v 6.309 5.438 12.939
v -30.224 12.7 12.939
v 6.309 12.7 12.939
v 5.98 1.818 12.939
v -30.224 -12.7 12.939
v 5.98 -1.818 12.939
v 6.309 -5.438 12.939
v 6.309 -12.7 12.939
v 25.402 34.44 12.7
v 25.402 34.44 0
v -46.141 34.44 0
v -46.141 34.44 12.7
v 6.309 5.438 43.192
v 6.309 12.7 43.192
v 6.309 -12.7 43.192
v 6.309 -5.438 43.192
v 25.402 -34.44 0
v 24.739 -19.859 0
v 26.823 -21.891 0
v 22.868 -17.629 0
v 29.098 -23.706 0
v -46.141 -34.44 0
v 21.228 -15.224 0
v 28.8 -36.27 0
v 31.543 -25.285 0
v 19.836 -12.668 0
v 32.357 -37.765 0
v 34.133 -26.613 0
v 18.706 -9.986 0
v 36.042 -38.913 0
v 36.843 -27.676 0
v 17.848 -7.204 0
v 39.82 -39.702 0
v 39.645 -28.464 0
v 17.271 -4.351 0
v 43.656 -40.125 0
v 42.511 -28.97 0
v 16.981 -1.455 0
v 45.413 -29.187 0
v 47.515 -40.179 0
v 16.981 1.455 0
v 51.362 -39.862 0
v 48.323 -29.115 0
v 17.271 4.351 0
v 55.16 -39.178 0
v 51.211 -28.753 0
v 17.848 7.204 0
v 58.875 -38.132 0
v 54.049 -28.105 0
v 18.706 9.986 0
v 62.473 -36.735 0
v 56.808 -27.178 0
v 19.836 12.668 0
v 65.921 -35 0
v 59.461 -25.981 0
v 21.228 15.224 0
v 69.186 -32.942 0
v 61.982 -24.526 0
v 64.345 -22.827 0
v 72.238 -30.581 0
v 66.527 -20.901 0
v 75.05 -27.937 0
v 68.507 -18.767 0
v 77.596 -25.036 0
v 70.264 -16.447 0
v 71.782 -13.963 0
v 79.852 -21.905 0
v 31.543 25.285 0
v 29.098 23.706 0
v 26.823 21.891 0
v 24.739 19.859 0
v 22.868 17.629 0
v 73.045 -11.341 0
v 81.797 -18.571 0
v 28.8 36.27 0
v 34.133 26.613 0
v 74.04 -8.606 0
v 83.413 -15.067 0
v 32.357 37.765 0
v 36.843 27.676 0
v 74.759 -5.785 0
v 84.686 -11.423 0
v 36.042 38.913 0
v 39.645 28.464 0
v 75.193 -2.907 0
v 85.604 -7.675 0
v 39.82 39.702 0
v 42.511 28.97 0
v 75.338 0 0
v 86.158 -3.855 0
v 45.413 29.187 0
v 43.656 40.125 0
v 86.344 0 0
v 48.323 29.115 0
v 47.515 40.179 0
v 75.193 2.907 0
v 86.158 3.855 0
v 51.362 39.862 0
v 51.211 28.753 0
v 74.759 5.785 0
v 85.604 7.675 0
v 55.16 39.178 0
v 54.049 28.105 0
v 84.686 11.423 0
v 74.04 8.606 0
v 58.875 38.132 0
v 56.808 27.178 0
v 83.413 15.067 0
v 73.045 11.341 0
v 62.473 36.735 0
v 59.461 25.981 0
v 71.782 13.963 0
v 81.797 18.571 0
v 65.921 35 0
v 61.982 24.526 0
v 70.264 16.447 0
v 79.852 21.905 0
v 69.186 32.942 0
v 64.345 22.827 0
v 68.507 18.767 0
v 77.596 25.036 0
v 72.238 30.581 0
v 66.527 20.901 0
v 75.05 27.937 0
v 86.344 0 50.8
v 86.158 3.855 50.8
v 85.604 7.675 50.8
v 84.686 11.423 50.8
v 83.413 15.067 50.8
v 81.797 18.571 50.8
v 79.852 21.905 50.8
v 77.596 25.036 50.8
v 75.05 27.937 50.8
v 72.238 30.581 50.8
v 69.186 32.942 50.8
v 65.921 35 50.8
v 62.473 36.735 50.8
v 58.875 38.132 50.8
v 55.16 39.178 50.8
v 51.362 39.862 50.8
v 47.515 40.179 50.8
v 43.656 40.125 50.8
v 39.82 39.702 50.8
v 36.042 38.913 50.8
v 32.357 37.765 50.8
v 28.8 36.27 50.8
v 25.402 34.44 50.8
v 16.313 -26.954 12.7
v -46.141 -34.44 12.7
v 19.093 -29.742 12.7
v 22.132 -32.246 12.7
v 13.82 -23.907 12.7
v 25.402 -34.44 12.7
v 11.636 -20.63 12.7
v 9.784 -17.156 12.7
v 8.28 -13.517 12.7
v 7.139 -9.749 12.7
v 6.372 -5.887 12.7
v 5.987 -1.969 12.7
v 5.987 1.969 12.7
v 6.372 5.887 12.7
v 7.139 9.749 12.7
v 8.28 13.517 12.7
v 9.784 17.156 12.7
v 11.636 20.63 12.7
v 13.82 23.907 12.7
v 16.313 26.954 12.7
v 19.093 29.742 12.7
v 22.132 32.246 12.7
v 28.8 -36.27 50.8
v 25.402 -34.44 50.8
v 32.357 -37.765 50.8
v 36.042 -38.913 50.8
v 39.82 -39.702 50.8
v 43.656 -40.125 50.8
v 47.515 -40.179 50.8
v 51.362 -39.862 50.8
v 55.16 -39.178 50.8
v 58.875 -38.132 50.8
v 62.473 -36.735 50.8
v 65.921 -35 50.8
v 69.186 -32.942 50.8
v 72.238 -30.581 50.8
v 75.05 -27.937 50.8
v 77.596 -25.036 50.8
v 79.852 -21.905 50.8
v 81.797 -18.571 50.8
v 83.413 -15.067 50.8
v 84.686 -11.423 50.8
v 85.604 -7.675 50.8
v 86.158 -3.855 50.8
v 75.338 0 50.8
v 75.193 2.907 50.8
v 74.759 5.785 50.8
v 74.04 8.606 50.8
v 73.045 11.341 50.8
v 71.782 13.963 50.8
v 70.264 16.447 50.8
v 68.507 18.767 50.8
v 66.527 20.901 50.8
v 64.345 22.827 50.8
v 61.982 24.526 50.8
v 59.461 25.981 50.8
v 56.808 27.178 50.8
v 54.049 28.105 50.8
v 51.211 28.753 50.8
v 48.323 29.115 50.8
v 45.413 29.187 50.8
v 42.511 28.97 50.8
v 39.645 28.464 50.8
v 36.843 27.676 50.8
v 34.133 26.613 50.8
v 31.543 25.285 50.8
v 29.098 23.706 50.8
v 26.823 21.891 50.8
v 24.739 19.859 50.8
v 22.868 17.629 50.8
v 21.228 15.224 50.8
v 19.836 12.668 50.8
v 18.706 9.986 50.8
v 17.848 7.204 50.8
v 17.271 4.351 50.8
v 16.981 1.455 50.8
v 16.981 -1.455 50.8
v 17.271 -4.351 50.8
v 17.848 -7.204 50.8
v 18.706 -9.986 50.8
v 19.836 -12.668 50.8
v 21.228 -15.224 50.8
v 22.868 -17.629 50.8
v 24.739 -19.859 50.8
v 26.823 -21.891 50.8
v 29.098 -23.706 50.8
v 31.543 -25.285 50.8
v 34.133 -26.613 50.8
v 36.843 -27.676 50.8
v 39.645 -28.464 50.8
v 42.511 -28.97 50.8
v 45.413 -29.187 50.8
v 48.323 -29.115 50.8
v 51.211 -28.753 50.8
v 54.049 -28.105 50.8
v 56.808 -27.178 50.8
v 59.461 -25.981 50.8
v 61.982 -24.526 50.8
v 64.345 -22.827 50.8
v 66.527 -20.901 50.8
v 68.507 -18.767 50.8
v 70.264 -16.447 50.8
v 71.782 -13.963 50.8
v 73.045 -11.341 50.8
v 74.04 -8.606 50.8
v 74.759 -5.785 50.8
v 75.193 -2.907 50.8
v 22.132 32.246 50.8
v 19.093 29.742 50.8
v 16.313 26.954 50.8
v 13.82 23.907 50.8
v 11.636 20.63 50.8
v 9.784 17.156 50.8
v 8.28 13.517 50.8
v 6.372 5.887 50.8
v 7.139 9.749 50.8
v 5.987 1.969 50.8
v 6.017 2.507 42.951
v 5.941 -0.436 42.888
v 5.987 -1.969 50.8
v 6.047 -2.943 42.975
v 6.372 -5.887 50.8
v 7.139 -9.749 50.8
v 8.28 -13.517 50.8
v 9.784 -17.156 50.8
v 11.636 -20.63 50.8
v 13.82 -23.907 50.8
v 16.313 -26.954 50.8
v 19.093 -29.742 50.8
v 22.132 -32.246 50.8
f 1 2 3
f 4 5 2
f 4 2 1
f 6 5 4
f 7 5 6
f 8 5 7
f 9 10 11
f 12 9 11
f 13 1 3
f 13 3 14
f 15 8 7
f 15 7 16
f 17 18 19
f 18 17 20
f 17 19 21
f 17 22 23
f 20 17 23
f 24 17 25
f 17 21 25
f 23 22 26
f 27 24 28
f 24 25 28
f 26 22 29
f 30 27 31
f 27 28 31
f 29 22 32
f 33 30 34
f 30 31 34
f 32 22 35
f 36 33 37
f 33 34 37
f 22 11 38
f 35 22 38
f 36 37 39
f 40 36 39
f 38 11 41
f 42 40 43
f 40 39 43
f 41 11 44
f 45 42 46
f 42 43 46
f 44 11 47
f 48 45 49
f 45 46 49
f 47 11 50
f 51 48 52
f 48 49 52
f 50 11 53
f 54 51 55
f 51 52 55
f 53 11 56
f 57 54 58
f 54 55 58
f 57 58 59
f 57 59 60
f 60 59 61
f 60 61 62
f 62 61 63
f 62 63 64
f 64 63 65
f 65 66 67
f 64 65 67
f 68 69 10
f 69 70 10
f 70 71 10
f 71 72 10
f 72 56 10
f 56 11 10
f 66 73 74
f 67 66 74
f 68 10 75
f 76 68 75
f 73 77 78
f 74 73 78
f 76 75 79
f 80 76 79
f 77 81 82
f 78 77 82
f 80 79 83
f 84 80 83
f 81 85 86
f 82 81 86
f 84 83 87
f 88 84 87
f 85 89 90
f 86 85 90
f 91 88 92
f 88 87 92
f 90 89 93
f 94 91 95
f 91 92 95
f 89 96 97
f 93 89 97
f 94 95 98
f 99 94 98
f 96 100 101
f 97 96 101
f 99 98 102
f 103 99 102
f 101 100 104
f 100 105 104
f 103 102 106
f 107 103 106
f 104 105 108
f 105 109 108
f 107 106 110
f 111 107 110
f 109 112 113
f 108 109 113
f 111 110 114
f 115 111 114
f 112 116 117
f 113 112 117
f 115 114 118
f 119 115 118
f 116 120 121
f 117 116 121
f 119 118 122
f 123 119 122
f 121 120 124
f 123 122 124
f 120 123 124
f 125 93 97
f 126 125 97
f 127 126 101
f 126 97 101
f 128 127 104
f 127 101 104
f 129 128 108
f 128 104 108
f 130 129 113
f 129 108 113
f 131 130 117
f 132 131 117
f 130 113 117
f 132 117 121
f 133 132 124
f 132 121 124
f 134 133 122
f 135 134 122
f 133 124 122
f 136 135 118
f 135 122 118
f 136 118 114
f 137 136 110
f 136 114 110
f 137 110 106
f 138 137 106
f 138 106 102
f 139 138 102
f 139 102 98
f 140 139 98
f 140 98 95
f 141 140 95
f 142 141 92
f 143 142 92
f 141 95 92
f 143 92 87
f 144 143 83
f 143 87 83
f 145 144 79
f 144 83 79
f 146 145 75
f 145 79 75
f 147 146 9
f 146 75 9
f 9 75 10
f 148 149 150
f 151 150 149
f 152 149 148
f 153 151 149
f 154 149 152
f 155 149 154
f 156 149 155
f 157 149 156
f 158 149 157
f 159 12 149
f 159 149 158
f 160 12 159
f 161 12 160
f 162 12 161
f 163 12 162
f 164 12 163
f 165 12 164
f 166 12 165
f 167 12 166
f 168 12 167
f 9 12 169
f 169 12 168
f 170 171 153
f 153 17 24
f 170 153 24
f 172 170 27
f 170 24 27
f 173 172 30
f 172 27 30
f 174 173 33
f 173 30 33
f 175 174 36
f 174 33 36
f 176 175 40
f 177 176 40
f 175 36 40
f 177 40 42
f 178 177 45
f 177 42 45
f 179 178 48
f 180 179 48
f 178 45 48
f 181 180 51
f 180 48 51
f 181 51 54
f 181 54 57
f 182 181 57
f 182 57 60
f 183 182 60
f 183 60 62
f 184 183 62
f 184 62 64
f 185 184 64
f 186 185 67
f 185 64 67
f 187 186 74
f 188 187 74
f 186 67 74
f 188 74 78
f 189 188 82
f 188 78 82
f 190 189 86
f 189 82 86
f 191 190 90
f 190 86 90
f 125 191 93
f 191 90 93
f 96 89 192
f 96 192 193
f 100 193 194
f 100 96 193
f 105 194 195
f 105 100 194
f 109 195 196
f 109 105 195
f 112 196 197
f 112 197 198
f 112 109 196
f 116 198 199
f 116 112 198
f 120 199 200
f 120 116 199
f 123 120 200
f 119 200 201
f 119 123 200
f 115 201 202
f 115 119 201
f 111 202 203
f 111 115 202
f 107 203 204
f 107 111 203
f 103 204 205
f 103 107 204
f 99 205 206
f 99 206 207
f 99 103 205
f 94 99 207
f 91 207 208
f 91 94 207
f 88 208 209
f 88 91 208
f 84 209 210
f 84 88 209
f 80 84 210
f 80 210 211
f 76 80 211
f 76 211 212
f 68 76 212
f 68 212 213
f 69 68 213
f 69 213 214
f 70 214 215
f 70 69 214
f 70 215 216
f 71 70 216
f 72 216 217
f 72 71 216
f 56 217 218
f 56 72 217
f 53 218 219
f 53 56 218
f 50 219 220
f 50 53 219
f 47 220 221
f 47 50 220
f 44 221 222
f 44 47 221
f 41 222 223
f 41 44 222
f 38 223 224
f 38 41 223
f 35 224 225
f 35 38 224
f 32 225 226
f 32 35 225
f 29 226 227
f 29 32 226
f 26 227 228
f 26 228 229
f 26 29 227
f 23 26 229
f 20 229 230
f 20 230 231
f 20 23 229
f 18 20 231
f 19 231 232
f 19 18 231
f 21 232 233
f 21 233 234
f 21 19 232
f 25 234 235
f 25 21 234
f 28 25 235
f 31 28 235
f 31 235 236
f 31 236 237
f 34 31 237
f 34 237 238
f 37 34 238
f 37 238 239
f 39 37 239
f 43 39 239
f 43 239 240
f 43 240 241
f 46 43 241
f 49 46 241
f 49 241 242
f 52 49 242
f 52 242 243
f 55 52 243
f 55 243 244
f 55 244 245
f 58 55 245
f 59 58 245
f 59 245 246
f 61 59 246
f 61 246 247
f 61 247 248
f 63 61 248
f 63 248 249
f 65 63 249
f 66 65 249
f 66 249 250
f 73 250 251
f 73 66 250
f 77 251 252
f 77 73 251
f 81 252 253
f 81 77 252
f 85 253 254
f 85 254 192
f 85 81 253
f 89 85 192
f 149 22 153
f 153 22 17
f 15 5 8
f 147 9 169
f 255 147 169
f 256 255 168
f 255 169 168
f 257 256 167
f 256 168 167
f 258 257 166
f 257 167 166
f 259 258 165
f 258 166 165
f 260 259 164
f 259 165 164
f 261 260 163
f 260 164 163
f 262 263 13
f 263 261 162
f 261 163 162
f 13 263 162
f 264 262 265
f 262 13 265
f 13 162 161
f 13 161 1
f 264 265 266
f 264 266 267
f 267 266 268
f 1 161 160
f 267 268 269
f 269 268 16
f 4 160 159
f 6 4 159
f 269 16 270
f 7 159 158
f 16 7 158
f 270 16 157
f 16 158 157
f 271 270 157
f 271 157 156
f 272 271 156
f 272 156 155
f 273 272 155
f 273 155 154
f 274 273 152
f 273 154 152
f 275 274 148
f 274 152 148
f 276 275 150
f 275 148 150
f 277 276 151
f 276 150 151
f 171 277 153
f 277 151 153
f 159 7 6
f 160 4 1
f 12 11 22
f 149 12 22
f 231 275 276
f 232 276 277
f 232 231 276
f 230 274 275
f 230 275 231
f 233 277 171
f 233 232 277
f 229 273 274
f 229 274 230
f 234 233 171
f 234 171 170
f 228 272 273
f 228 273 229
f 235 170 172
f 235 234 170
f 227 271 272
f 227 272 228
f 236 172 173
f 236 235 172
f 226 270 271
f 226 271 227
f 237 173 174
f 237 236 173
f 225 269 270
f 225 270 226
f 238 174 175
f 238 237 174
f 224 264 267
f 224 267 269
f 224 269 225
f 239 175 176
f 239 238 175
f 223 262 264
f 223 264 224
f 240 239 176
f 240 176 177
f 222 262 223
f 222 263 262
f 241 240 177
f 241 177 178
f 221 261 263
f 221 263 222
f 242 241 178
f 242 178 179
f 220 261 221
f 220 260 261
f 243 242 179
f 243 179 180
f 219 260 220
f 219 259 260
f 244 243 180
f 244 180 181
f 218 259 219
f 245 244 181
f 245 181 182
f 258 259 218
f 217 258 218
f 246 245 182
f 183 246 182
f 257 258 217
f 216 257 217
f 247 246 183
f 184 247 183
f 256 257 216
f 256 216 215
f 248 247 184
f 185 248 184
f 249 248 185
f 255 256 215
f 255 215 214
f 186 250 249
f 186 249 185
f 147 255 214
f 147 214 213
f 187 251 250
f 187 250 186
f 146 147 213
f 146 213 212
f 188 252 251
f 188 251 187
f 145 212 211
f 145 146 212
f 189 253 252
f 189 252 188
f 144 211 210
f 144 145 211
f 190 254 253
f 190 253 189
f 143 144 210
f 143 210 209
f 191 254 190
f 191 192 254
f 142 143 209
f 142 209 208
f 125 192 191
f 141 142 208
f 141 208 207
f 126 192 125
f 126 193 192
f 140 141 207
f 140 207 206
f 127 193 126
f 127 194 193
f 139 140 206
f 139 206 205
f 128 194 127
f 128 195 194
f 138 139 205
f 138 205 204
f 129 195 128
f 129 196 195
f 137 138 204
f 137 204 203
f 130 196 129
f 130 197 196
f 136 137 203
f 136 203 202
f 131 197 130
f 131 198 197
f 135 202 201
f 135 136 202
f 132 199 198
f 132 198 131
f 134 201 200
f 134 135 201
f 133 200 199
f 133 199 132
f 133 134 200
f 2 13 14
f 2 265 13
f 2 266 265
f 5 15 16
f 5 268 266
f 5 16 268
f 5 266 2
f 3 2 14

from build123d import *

# Parameters (mm, degrees)
F1_DEPTH = 12.7
F0_R     = 29.196285
F2_DEPTH = 50.8
F4_DEPTH = 12.7


with BuildPart() as f1:
    # F0 (on Top) → F1 (new body)
    with BuildSketch(Plane.XY):
        with BuildLine():
            Line((25.401515, 34.4395), (-46.141323, 34.4395))
            Line((-46.141323, 34.4395), (-46.141323, -34.4395))
            Line((-46.141323, -34.4395), (25.401515, -34.4395))
            ThreePointArc((25.401515, -34.4395), (5.939099, 0), (25.401515, 34.4395))
        make_face()
    extrude(amount=F1_DEPTH)

    # F0 (on Top) → F2 (join)
    with BuildSketch(Plane.XY):
        with BuildLine():
            ThreePointArc((86.343547, 0), (65.920509, 35.000037), (25.401515, 34.4395))
            ThreePointArc((25.401515, 34.4395), (5.939099, 0), (25.401515, -34.4395))
            ThreePointArc((25.401515, -34.4395), (65.920509, -35.000037), (86.343547, 0))
        make_face()
        with Locations((46.141323, 0)):
            Circle(F0_R, mode=Mode.SUBTRACT)
    extrude(amount=F2_DEPTH)

    # F3 (on Front) → F4 (join, symmetric)
    with BuildSketch(Plane.XZ):
        Polygon((6.308553, 12.938597), (6.308553, 43.192081), (-30.223956, 12.938597), align=None)
    extrude(amount=F4_DEPTH, both=True)


solid = f1.part
